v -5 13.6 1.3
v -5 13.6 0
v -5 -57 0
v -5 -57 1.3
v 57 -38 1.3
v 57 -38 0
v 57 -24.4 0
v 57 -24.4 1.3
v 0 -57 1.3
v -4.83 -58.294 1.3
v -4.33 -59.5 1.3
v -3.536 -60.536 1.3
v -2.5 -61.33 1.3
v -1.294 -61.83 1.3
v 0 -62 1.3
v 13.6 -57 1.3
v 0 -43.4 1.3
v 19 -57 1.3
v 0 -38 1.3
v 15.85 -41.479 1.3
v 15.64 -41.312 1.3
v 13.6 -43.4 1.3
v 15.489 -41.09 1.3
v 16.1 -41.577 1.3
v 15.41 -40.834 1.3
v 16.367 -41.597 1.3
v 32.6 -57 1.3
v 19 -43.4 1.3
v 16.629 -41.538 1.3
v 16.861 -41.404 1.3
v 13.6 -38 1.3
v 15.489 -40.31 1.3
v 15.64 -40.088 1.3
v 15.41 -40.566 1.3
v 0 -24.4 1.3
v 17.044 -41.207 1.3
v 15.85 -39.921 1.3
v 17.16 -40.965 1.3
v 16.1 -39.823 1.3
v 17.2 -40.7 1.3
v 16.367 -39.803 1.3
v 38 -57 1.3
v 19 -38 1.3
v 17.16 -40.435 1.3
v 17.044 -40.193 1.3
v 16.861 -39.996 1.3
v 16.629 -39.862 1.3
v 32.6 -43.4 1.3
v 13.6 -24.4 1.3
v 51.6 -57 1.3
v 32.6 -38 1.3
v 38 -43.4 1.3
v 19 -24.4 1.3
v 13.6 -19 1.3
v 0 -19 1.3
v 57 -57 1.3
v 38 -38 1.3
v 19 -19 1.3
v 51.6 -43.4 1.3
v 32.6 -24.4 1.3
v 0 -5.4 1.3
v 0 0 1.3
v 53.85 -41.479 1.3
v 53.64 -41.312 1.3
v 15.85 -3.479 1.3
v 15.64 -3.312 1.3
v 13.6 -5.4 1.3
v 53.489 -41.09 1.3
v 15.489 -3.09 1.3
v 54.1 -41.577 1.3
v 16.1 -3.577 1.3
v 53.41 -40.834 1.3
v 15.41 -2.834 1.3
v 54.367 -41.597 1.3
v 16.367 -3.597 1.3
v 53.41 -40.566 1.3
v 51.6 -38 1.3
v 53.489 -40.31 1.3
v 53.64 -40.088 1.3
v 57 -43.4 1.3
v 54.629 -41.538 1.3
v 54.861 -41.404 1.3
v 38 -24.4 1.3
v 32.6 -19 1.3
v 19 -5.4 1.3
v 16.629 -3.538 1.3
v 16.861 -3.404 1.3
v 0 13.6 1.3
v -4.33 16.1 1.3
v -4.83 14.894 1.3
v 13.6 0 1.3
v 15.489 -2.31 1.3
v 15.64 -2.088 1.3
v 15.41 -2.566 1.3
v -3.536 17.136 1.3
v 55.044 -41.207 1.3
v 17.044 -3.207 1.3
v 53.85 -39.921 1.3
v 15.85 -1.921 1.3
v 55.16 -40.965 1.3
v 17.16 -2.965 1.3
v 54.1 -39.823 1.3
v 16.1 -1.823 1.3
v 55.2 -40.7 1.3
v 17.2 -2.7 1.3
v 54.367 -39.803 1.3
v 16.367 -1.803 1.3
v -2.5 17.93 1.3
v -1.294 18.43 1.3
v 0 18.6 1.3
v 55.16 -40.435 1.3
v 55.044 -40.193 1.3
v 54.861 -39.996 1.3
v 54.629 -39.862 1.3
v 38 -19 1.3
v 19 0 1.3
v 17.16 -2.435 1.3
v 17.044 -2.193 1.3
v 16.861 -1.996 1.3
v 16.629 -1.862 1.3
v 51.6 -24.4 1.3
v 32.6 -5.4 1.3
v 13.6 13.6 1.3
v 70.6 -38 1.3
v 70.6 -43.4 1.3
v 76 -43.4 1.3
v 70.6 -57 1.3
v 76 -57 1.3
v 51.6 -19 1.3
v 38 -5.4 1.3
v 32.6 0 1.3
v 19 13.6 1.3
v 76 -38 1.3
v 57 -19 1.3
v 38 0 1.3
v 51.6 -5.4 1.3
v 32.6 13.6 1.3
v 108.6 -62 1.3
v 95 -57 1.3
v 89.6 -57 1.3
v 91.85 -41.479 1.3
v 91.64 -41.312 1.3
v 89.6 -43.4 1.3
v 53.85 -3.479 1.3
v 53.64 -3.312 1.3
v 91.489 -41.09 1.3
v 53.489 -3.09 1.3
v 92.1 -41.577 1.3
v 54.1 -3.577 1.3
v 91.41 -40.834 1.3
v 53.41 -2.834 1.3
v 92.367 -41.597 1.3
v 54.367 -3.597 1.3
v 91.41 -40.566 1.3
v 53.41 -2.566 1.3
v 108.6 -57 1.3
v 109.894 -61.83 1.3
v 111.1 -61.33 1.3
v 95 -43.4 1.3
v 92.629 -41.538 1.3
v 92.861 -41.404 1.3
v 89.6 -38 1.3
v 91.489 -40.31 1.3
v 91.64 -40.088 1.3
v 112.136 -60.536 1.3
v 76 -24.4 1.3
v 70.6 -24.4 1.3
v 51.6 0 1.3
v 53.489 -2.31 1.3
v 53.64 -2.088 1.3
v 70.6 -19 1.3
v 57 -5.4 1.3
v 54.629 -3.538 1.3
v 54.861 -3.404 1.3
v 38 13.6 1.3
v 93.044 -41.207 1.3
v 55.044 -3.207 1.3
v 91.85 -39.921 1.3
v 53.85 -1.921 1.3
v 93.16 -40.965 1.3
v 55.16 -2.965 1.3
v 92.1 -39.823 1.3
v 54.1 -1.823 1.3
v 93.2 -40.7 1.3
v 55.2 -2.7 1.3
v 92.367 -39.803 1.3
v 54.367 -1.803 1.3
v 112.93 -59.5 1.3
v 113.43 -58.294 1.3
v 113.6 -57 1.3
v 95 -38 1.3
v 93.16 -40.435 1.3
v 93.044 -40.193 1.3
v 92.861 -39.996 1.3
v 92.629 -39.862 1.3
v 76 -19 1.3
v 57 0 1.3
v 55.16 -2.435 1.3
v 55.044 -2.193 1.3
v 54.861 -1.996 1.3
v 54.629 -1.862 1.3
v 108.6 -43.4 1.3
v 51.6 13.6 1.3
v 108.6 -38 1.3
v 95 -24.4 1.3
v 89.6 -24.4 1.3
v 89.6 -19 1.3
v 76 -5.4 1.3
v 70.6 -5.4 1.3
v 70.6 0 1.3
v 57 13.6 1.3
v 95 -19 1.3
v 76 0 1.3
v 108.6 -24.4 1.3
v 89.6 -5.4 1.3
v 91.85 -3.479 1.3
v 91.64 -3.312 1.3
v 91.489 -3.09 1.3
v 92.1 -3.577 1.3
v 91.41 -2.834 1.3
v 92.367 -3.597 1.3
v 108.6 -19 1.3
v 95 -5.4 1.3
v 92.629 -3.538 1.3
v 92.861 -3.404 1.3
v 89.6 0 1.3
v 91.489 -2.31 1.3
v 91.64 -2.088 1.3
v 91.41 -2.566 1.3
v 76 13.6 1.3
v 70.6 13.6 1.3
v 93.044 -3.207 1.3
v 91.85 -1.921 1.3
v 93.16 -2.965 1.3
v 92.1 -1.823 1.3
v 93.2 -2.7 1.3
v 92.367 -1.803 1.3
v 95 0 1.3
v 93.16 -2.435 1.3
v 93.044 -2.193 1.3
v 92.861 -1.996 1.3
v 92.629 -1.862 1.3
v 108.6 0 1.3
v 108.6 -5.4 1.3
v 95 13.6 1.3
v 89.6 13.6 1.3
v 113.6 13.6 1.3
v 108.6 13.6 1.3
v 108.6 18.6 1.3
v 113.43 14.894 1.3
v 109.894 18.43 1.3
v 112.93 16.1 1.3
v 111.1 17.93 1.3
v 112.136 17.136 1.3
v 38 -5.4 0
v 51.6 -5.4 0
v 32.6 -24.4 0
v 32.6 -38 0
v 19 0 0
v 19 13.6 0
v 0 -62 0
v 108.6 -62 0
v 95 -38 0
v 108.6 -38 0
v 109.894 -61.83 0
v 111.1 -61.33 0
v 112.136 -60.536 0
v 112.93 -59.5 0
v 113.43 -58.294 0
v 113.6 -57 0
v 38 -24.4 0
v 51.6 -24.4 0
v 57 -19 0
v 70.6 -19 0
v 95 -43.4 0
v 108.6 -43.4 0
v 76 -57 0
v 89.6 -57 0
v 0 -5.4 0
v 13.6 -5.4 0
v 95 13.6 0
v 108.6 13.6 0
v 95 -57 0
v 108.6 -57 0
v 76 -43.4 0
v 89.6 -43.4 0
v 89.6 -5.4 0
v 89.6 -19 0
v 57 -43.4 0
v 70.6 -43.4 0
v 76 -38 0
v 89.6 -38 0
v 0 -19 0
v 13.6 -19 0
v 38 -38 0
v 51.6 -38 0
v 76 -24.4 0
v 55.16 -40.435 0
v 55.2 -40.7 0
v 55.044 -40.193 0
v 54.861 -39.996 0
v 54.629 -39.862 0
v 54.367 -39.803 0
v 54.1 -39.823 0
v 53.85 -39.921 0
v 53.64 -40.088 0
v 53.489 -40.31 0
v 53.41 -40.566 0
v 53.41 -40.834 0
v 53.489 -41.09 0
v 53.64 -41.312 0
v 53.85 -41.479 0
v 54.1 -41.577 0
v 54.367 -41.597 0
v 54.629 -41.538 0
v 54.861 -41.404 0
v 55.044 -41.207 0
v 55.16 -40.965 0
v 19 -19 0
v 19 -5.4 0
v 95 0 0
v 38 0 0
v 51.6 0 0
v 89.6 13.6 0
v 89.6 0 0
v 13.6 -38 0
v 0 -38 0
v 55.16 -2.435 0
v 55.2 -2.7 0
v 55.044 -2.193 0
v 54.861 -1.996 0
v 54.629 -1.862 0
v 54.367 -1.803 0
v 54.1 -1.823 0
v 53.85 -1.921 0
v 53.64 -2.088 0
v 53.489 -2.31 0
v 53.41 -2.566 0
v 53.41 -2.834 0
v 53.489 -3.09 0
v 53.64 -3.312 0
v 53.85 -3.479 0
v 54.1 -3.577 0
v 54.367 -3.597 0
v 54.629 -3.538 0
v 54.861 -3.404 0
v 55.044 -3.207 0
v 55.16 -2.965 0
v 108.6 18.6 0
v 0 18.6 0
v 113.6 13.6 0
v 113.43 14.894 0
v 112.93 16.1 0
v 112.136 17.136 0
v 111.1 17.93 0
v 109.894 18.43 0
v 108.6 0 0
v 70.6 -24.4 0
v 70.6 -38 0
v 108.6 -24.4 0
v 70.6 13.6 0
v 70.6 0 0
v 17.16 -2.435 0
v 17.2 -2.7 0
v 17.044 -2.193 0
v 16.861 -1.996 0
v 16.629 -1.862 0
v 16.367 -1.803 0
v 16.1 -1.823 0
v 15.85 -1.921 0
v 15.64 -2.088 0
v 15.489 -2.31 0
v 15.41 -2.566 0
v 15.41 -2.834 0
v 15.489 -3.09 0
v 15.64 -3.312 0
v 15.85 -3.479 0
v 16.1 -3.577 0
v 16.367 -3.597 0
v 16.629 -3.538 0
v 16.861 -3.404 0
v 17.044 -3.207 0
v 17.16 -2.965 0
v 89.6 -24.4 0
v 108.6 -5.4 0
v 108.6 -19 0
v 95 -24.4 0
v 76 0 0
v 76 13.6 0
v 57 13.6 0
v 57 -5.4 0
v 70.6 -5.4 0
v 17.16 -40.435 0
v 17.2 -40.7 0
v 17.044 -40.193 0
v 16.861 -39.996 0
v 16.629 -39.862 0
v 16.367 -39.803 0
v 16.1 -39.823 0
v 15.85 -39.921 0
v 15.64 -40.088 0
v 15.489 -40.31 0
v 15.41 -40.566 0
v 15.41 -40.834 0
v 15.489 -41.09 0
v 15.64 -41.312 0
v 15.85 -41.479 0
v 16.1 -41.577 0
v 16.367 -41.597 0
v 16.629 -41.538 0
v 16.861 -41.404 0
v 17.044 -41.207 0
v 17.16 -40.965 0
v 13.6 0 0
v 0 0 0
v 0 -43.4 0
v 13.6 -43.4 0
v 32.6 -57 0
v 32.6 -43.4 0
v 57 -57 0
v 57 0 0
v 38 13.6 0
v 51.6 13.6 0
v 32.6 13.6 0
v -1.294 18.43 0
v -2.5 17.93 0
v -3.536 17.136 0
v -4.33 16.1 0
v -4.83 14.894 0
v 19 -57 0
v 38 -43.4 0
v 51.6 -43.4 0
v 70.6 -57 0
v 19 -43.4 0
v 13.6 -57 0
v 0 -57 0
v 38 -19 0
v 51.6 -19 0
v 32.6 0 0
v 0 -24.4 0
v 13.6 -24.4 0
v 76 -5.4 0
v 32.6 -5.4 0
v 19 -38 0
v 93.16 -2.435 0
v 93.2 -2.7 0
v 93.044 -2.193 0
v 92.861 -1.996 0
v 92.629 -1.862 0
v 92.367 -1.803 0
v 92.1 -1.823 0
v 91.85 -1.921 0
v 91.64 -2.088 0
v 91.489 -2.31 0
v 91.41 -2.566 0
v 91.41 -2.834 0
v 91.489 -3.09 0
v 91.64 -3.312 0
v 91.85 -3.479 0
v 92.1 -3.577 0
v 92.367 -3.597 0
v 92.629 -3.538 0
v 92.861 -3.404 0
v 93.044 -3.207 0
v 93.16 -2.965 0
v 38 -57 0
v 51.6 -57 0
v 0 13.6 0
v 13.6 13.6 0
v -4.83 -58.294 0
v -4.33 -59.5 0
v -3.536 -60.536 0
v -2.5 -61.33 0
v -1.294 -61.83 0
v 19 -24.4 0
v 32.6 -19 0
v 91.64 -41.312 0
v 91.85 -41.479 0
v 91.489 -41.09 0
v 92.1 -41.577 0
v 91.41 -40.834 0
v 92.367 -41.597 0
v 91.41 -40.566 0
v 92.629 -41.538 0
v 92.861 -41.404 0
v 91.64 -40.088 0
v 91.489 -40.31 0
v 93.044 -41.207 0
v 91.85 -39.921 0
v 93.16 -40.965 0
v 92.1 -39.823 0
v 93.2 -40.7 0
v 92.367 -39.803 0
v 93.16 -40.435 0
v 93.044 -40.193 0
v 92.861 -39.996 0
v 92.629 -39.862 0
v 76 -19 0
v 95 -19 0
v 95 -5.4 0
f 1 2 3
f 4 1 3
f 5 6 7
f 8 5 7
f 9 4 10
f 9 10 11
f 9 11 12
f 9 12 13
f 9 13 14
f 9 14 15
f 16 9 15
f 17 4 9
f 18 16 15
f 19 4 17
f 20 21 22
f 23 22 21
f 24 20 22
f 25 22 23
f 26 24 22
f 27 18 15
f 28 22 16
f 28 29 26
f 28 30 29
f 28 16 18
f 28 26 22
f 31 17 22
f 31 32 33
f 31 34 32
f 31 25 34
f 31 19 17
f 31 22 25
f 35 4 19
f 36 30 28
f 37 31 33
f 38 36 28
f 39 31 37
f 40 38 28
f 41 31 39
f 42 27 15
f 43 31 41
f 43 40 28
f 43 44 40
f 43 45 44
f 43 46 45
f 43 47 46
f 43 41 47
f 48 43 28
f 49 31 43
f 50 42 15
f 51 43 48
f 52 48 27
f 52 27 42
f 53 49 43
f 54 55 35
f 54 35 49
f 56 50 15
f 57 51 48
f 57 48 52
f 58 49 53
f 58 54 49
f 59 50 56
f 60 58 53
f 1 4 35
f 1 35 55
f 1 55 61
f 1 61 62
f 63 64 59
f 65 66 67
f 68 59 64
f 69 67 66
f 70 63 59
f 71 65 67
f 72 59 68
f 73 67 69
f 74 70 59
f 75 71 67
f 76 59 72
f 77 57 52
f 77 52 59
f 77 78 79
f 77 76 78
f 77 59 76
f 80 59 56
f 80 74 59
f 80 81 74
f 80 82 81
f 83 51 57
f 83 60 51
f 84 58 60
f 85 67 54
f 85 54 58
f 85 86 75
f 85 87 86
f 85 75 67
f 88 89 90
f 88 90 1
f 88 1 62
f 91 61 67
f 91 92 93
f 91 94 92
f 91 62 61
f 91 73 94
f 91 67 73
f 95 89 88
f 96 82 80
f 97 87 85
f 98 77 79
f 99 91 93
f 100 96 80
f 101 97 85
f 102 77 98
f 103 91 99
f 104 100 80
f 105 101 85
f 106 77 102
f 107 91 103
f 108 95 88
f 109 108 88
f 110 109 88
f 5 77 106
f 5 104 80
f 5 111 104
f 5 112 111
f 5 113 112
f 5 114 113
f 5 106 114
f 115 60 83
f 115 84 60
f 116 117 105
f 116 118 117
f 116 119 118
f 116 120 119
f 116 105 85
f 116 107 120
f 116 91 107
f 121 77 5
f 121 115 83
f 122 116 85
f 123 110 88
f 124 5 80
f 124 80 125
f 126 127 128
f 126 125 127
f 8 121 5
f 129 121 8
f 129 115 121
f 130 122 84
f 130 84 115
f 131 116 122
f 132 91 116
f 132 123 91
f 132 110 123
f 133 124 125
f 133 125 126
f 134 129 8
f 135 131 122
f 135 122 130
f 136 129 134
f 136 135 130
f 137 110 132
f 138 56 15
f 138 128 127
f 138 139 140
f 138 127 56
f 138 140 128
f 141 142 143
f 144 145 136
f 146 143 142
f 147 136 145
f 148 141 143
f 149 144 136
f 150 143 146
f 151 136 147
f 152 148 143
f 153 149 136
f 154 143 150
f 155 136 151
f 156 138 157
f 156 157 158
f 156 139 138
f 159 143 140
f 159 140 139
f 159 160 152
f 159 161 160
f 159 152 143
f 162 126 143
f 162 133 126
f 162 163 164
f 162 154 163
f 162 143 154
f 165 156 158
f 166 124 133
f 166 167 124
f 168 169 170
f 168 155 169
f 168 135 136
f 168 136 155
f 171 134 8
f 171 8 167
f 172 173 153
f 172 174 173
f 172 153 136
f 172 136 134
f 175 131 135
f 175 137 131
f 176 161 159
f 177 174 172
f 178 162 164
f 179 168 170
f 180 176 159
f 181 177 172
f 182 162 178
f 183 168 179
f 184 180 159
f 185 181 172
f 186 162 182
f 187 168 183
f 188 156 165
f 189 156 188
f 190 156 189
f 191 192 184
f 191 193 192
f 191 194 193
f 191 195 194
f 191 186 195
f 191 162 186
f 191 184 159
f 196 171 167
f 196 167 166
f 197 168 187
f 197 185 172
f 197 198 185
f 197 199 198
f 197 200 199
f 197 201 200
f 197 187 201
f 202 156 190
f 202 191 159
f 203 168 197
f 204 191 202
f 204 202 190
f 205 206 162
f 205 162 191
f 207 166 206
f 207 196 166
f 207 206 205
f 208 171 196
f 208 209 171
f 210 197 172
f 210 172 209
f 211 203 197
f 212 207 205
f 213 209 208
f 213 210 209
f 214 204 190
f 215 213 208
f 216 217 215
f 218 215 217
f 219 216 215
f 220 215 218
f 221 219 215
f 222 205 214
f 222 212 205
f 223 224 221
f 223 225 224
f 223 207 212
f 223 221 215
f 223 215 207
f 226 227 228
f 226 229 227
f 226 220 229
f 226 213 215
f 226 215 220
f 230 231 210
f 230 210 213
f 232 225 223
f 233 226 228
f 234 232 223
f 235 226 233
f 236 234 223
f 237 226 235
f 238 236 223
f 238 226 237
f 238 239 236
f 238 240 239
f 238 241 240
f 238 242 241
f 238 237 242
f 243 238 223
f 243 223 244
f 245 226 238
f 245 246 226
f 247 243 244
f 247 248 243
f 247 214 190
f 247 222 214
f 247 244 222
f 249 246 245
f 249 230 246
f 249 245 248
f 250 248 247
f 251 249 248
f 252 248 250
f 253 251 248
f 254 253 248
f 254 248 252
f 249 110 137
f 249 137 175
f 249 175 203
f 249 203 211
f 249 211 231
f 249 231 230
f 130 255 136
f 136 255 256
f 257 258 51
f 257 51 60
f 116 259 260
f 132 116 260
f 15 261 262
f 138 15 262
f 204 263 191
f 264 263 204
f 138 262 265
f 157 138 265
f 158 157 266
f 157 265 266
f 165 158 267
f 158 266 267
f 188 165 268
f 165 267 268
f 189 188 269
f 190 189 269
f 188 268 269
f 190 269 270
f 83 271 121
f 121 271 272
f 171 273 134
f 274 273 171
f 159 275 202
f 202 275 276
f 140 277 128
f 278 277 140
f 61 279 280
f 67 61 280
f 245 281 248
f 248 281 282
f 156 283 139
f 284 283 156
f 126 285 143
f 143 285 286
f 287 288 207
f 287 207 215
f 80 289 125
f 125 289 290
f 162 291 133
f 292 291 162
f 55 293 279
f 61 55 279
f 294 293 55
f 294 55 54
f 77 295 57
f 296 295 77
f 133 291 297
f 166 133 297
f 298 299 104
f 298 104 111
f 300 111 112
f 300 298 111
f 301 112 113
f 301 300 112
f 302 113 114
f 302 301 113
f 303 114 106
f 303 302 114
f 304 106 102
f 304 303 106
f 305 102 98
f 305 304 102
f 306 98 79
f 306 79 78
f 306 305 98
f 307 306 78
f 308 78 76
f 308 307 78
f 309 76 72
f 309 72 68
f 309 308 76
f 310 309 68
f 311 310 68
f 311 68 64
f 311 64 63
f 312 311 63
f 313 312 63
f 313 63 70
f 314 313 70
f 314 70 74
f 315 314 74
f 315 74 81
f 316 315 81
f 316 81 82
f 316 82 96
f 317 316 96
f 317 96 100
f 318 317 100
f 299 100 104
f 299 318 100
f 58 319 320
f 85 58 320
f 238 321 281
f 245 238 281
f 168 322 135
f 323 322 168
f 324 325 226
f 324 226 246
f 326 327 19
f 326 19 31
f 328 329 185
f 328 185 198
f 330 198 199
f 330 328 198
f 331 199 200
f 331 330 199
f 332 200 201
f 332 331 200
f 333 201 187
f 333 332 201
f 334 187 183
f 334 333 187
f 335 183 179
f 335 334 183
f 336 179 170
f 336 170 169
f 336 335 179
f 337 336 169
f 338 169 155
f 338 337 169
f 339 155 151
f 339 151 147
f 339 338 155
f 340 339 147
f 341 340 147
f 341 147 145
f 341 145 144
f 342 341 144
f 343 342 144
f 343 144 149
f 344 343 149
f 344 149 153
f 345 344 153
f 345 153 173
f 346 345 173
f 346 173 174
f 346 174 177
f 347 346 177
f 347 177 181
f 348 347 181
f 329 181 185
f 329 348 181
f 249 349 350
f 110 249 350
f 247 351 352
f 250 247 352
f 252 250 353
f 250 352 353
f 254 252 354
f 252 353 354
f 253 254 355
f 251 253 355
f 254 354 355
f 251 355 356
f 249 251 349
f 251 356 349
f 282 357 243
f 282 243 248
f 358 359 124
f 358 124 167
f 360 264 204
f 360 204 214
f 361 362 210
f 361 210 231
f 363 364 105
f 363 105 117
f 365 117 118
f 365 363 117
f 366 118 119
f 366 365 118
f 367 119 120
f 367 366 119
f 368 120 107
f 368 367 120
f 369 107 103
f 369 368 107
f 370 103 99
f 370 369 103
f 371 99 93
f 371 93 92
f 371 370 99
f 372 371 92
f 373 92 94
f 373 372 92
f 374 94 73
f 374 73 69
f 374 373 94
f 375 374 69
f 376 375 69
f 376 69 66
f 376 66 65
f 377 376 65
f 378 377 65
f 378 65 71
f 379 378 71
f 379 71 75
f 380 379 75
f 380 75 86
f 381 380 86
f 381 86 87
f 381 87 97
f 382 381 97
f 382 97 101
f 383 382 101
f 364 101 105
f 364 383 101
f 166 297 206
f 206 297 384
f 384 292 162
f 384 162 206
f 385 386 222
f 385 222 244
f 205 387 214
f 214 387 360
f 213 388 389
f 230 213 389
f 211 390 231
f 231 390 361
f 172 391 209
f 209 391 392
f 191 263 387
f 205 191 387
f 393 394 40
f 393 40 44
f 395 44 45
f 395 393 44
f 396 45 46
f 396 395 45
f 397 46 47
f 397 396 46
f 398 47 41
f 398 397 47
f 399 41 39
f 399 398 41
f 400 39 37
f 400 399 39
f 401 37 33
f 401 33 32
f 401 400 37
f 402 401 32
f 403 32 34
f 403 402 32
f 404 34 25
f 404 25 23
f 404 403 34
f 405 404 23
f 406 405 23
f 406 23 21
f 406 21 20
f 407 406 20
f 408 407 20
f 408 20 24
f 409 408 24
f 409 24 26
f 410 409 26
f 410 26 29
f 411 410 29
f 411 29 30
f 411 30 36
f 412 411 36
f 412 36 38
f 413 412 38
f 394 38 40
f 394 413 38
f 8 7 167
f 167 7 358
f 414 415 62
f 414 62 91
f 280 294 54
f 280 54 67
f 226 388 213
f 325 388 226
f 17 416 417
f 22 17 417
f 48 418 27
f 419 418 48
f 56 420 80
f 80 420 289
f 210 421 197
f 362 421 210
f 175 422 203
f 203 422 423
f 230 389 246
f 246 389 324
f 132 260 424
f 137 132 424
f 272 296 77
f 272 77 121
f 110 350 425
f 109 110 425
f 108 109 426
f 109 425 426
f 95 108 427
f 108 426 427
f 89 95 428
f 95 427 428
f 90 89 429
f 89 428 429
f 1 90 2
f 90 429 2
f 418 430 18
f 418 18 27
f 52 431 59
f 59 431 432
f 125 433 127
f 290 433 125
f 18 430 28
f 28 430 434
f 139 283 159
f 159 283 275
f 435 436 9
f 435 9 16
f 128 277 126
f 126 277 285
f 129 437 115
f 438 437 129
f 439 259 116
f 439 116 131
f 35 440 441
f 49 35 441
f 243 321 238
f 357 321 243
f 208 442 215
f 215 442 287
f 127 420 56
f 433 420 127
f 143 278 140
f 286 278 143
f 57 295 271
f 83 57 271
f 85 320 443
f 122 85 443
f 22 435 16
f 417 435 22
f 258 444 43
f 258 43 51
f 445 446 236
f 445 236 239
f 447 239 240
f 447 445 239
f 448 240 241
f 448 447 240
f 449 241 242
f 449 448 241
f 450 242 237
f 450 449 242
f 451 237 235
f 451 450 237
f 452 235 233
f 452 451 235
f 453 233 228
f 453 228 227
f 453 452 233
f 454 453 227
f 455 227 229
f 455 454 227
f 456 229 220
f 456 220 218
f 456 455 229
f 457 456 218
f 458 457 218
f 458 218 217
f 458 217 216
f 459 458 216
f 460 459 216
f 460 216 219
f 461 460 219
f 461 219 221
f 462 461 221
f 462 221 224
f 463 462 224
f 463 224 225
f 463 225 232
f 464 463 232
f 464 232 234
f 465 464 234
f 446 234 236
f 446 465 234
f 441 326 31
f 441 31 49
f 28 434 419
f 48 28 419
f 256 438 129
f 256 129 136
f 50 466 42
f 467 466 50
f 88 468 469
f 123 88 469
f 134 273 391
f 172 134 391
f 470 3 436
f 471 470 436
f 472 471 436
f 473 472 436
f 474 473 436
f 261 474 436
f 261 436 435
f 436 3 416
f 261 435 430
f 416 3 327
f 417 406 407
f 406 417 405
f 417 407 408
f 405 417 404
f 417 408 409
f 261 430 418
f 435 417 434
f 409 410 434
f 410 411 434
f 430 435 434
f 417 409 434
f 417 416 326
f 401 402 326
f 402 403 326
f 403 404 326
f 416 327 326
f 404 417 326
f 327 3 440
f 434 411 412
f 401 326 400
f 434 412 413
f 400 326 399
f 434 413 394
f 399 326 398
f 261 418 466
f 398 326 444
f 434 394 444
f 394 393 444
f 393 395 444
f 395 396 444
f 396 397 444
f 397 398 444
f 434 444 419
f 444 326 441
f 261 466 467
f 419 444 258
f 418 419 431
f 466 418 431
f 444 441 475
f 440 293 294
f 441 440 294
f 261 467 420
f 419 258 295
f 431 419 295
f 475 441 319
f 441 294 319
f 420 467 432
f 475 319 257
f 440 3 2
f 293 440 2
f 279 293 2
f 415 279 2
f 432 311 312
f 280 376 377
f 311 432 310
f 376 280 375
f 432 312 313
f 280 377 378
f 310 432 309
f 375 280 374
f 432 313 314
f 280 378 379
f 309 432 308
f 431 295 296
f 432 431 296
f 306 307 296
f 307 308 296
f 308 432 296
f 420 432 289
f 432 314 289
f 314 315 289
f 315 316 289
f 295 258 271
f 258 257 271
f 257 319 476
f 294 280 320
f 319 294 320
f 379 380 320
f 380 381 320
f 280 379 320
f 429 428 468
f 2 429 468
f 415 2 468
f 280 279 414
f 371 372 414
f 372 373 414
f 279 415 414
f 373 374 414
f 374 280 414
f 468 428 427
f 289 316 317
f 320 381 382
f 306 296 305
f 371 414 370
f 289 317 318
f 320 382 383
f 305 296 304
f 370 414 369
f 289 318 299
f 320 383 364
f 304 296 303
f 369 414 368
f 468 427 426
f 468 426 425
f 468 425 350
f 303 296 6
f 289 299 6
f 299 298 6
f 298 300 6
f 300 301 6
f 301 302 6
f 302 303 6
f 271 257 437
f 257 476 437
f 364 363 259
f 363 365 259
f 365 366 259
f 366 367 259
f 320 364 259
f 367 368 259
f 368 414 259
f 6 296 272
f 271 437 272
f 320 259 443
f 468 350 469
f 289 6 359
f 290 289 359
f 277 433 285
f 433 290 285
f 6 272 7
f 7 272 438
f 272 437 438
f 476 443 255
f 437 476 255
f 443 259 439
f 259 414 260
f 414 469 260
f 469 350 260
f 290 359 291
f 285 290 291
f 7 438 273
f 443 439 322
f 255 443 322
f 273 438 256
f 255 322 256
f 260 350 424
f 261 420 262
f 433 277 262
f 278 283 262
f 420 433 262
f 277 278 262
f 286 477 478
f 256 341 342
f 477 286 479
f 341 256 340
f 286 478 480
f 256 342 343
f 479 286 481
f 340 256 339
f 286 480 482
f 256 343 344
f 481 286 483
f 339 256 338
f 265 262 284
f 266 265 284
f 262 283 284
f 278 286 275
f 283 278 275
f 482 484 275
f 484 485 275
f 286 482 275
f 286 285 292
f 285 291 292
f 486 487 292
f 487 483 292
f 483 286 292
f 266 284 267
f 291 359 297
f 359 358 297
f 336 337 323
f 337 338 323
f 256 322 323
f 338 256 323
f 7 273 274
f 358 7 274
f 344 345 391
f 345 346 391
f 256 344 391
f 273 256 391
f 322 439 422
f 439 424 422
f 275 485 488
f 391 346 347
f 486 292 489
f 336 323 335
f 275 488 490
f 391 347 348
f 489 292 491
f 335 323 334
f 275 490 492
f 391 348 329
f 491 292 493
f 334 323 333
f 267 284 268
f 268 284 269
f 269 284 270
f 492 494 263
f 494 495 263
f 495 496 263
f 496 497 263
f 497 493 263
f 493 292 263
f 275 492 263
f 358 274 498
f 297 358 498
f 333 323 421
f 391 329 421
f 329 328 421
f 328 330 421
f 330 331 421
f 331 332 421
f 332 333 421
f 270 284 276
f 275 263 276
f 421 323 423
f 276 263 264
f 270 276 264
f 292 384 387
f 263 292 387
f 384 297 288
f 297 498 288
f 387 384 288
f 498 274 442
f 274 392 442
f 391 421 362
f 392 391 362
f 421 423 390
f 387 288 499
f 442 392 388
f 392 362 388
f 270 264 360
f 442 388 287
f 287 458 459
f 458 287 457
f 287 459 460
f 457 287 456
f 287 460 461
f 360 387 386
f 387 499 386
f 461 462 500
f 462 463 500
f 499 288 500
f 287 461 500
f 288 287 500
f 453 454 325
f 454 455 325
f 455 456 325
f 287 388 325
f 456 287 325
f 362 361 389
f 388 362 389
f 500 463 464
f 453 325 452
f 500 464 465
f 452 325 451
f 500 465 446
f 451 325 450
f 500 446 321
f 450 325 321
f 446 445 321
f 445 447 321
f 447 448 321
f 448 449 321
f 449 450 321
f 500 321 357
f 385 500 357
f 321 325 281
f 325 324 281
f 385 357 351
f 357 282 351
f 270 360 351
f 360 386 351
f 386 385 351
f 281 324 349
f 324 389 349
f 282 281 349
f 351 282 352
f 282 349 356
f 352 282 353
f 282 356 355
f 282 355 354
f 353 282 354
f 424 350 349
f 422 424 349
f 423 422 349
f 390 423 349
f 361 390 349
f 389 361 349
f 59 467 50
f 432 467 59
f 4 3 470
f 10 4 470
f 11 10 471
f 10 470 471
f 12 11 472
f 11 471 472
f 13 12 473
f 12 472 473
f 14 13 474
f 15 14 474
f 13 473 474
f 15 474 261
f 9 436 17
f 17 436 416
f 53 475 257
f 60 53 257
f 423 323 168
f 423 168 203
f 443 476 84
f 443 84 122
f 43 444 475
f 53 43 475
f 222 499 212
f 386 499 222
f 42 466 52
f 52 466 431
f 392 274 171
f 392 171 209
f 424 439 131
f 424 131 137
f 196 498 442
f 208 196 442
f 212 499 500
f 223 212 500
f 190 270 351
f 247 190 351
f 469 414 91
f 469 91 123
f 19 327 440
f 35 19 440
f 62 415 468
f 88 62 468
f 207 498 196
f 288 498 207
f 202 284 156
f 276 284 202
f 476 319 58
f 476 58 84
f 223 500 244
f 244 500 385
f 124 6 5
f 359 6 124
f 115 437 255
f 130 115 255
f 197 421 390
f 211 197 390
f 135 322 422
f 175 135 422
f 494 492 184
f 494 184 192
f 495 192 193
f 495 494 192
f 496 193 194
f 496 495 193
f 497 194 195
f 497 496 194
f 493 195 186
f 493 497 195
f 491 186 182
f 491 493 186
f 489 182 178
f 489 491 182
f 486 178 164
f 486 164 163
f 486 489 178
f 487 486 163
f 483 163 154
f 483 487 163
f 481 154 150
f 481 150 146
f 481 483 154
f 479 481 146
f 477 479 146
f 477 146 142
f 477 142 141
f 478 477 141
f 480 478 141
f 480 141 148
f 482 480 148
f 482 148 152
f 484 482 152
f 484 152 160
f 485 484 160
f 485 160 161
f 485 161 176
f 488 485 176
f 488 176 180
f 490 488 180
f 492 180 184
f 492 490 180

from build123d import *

# Parameters (mm, degrees)
SKETCH_R  = 0.9
SKETCH_W  = 13.6
SKETCH_H  = 13.6
PAD_DEPTH = 1.3


with BuildPart() as part:
    # Sketch → Pad (new body)
    with BuildSketch(Plane.XY):
        with BuildLine():
            ThreePointArc((0, 18.6), (-3.535534, 17.135534), (-5, 13.6))
            Line((-5, 13.6), (-5, -57))
            ThreePointArc((-5, -57), (-3.535534, -60.535534), (0, -62))
            Line((0, -62), (108.6, -62))
            ThreePointArc((108.6, -62), (112.135534, -60.535534), (113.6, -57))
            Line((113.6, -57), (113.6, 13.6))
            ThreePointArc((113.6, 13.6), (112.135534, 17.135534), (108.6, 18.6))
            Line((108.6, 18.6), (0, 18.6))
        make_face()
        with Locations((92.3, -40.7)):
            Circle(SKETCH_R, mode=Mode.SUBTRACT)
        with Locations((54.3, -40.7)):
            Circle(SKETCH_R, mode=Mode.SUBTRACT)
        with Locations((16.3, -40.7)):
            Circle(SKETCH_R, mode=Mode.SUBTRACT)
        with Locations((16.3, -2.7)):
            Circle(SKETCH_R, mode=Mode.SUBTRACT)
        with Locations((54.3, -2.7)):
            Circle(SKETCH_R, mode=Mode.SUBTRACT)
        with Locations((92.3, -2.7)):
            Circle(SKETCH_R, mode=Mode.SUBTRACT)
        with Locations((6.8, 6.8)):
            Rectangle(SKETCH_W, SKETCH_H, mode=Mode.SUBTRACT)
        with Locations((25.8, 6.8)):
            Rectangle(SKETCH_W, SKETCH_H, mode=Mode.SUBTRACT)
        with Locations((44.8, 6.8)):
            Rectangle(SKETCH_W, SKETCH_H, mode=Mode.SUBTRACT)
        with Locations((63.8, 6.8)):
            Rectangle(SKETCH_W, SKETCH_H, mode=Mode.SUBTRACT)
        with Locations((82.8, 6.8)):
            Rectangle(SKETCH_W, SKETCH_H, mode=Mode.SUBTRACT)
        with Locations((101.8, 6.8)):
            Rectangle(SKETCH_W, SKETCH_H, mode=Mode.SUBTRACT)
        with Locations((6.8, -12.2)):
            Rectangle(SKETCH_W, SKETCH_H, mode=Mode.SUBTRACT)
        with Locations((25.8, -12.2)):
            Rectangle(SKETCH_W, SKETCH_H, mode=Mode.SUBTRACT)
        with Locations((44.8, -12.2)):
            Rectangle(SKETCH_W, SKETCH_H, mode=Mode.SUBTRACT)
        with Locations((63.8, -12.2)):
            Rectangle(SKETCH_W, SKETCH_H, mode=Mode.SUBTRACT)
        with Locations((82.8, -12.2)):
            Rectangle(SKETCH_W, SKETCH_H, mode=Mode.SUBTRACT)
        with Locations((101.8, -12.2)):
            Rectangle(SKETCH_W, SKETCH_H, mode=Mode.SUBTRACT)
        with Locations((6.8, -31.2)):
            Rectangle(SKETCH_W, SKETCH_H, mode=Mode.SUBTRACT)
        with Locations((25.8, -31.2)):
            Rectangle(SKETCH_W, SKETCH_H, mode=Mode.SUBTRACT)
        with Locations((44.8, -31.2)):
            Rectangle(SKETCH_W, SKETCH_H, mode=Mode.SUBTRACT)
        with Locations((63.8, -31.2)):
            Rectangle(SKETCH_W, SKETCH_H, mode=Mode.SUBTRACT)
        with Locations((82.8, -31.2)):
            Rectangle(SKETCH_W, SKETCH_H, mode=Mode.SUBTRACT)
        with Locations((101.8, -31.2)):
            Rectangle(SKETCH_W, SKETCH_H, mode=Mode.SUBTRACT)
        with Locations((6.8, -50.2)):
            Rectangle(SKETCH_W, SKETCH_H, mode=Mode.SUBTRACT)
        with Locations((25.8, -50.2)):
            Rectangle(SKETCH_W, SKETCH_H, mode=Mode.SUBTRACT)
        with Locations((44.8, -50.2)):
            Rectangle(SKETCH_W, SKETCH_H, mode=Mode.SUBTRACT)
        with Locations((63.8, -50.2)):
            Rectangle(SKETCH_W, SKETCH_H, mode=Mode.SUBTRACT)
        with Locations((82.8, -50.2)):
            Rectangle(SKETCH_W, SKETCH_H, mode=Mode.SUBTRACT)
        with Locations((101.8, -50.2)):
            Rectangle(SKETCH_W, SKETCH_H, mode=Mode.SUBTRACT)
    extrude(amount=PAD_DEPTH)


solid = part.part
